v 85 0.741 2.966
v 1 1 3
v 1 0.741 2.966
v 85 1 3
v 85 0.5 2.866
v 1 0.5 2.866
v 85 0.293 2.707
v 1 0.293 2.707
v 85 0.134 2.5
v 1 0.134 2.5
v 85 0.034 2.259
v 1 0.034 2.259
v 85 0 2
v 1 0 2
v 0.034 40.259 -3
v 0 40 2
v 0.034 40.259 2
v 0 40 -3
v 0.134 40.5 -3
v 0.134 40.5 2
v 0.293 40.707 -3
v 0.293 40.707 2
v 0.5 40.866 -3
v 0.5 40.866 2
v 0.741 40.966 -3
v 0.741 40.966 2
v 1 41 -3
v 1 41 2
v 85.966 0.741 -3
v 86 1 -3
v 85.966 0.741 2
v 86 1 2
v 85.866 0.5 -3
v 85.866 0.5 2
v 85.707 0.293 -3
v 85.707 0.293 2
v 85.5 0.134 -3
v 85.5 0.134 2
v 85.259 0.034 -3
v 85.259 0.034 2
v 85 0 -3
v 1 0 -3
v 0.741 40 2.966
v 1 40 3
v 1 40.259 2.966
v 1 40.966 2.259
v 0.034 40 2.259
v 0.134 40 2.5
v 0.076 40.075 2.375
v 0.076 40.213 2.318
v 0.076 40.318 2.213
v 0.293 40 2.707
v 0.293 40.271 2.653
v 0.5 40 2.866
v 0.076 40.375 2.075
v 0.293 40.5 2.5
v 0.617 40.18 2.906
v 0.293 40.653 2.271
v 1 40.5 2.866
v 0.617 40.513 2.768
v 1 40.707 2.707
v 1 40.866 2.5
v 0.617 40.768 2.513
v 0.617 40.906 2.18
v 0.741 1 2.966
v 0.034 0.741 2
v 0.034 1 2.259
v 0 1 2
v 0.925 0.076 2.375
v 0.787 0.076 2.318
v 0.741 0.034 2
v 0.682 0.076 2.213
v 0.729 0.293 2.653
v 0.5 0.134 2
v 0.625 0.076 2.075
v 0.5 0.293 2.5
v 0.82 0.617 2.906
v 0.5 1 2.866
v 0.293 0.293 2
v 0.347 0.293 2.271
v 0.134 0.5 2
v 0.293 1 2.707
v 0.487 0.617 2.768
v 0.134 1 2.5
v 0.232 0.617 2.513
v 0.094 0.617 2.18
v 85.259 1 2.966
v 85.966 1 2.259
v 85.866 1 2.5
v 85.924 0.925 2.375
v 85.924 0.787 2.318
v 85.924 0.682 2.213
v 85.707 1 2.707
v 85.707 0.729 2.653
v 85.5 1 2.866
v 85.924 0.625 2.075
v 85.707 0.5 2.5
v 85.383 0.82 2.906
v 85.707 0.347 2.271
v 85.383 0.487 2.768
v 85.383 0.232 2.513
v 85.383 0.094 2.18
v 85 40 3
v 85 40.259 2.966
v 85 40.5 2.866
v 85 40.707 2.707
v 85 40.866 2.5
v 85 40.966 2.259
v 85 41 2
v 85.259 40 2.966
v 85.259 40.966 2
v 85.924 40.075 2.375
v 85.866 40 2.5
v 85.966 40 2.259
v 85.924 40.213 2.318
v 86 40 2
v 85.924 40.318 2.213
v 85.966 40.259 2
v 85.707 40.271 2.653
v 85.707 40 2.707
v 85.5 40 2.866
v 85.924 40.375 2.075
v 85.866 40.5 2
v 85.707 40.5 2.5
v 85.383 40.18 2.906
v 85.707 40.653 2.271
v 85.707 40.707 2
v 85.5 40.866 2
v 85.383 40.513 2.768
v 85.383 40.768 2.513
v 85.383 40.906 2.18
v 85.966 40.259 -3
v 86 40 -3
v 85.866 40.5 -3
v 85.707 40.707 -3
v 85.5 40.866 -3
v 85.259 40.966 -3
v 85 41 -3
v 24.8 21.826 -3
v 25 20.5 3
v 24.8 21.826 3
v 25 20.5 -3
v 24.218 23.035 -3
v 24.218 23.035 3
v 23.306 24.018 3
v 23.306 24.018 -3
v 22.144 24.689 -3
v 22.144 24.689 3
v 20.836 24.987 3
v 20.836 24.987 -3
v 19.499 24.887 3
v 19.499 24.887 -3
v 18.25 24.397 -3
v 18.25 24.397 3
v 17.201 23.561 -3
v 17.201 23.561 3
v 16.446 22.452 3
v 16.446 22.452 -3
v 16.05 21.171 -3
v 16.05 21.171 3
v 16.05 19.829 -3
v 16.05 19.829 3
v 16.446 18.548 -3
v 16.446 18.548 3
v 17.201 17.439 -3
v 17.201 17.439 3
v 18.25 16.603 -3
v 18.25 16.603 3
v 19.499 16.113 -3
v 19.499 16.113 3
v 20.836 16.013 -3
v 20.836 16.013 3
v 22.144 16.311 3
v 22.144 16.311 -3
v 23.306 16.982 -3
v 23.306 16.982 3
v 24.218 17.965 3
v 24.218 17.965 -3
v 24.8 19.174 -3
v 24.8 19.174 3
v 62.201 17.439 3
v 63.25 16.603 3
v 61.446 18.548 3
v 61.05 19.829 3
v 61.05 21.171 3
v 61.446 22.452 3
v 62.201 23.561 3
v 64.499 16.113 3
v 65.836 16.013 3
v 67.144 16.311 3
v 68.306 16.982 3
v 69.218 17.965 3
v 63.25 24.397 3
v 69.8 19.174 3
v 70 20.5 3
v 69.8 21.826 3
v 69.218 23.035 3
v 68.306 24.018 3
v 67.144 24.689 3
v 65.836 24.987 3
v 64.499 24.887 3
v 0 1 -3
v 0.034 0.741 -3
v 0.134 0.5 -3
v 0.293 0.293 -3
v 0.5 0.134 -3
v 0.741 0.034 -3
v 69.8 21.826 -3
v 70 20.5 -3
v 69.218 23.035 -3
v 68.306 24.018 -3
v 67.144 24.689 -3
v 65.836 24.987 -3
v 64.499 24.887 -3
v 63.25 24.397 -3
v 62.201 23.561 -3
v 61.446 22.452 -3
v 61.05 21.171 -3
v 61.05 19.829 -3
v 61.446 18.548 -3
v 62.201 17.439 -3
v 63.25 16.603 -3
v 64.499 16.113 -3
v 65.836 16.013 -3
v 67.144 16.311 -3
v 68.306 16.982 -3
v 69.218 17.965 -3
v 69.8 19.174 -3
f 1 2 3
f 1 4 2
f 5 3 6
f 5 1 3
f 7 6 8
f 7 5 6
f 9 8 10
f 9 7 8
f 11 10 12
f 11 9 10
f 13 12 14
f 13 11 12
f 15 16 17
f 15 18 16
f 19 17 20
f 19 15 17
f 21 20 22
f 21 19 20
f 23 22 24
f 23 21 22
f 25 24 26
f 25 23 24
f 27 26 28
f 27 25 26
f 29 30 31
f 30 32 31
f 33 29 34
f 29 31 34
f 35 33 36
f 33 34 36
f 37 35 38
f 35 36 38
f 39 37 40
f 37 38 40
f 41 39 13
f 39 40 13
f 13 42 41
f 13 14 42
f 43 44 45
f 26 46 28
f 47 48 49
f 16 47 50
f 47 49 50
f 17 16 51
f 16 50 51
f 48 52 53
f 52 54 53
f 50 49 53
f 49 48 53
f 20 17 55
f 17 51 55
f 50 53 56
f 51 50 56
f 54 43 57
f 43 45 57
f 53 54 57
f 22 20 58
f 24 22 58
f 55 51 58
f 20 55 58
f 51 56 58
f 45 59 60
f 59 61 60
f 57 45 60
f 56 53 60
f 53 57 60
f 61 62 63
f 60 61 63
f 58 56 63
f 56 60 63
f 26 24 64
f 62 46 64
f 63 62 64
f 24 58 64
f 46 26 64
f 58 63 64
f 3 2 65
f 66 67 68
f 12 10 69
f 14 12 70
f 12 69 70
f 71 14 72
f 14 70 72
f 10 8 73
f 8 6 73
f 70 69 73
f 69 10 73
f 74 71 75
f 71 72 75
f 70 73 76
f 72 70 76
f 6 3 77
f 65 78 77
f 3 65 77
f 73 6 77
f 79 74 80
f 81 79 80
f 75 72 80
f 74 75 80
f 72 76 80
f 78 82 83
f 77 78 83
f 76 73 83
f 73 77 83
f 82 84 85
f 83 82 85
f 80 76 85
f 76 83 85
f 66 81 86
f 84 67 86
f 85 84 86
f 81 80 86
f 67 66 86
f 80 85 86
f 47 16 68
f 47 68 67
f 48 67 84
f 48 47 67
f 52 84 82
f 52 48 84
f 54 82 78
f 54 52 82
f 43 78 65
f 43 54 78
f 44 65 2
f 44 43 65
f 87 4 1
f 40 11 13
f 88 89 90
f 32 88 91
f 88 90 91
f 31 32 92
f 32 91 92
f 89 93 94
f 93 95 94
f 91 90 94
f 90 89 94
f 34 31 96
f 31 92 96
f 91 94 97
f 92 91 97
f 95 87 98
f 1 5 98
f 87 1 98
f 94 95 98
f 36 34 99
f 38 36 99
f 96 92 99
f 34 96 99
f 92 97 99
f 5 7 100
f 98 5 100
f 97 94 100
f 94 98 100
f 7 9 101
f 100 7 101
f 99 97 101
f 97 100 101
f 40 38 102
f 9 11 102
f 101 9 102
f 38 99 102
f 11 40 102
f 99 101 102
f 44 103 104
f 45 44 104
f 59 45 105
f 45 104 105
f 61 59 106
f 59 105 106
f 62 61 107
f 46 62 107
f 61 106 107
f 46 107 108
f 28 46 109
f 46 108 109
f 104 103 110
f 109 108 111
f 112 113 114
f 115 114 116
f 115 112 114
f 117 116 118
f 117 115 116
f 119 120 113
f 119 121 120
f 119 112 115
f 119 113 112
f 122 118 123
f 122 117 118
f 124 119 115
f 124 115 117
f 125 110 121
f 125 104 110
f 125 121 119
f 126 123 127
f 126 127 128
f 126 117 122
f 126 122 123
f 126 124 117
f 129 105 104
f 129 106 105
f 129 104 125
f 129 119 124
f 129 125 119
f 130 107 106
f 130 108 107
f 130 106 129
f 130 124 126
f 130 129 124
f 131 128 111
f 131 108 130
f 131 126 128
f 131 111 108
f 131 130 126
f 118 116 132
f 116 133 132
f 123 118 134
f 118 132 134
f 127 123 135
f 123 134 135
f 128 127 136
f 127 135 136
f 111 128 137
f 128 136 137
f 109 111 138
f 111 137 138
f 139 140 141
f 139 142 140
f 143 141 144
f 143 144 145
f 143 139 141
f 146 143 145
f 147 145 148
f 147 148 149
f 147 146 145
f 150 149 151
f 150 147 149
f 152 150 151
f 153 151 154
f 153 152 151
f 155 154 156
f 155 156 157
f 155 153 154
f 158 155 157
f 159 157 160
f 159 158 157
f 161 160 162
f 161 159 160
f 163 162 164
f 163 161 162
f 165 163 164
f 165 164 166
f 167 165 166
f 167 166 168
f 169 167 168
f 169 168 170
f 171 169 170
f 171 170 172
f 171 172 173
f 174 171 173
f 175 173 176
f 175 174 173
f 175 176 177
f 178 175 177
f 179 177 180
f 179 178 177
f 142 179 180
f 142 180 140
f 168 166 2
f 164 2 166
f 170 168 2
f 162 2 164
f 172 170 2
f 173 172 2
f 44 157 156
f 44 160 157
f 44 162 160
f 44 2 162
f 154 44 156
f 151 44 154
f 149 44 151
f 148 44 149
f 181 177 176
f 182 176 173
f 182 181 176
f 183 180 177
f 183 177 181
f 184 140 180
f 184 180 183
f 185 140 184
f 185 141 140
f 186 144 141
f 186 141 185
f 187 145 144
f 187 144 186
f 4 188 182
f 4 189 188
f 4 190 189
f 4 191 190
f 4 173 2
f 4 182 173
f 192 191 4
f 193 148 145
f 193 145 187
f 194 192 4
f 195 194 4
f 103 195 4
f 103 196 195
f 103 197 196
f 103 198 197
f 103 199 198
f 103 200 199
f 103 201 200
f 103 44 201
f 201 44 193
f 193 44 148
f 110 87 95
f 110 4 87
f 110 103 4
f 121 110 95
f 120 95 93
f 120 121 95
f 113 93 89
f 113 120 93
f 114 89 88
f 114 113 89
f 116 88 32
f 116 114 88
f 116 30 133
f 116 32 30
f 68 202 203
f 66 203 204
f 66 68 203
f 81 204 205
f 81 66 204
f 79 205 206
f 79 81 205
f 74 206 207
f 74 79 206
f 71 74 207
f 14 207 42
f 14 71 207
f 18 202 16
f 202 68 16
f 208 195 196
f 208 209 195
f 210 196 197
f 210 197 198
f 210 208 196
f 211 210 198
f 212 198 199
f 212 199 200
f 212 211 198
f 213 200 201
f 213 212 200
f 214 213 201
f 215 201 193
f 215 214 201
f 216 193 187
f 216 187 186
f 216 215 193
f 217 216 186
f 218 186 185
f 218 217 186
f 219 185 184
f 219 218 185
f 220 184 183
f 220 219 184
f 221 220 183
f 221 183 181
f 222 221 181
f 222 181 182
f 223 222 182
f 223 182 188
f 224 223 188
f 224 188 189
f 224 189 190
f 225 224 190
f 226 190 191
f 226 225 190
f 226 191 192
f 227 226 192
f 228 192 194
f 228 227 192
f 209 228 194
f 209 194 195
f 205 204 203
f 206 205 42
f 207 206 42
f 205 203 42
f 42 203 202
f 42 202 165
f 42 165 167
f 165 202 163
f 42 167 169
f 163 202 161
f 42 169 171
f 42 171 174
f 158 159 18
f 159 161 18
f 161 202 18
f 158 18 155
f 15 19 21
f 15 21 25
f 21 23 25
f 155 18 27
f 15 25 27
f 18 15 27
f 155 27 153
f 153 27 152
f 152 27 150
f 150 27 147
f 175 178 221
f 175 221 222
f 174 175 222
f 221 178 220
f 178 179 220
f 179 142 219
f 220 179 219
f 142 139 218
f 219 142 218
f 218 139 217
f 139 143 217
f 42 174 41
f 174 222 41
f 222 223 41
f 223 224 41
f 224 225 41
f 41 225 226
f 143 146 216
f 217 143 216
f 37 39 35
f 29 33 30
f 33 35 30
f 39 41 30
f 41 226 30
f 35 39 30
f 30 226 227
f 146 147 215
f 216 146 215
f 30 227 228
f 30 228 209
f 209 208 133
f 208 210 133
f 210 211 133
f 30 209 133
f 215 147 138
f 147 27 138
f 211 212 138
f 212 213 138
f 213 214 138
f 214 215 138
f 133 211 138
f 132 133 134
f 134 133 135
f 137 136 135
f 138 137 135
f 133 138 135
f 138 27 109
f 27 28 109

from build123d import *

# Parameters (mm, degrees)
SKETCH1_W           = 86
SKETCH1_H           = 41
SKETCH1_R           = 4.5
BOSS_EXTRUDE1_DEPTH = 3
FILLET1_R           = 1


with BuildPart() as part:
    # Sketch1 → Boss-Extrude1 (new body, symmetric)
    with BuildSketch(Plane.XY):
        with Locations((43, 20.5)):
            Rectangle(SKETCH1_W, SKETCH1_H)
        with Locations((20.5, 20.5)):
            Circle(SKETCH1_R, mode=Mode.SUBTRACT)
        with Locations((65.5, 20.5)):
            Circle(SKETCH1_R, mode=Mode.SUBTRACT)
    extrude(amount=BOSS_EXTRUDE1_DEPTH, both=True)

    # Fillet1
    fillet1_edges = [part.edges().sort_by_distance(p)[0] for p in [
        (43, 41, 3),
        (0, 20.5, 3),
        (43, 0, 3),
        (86, 20.5, 3),
        (0, 0, 0),
        (0, 41, 0),
        (86, 41, 0),
        (86, 0, 0),
    ]]
    fillet(fillet1_edges, radius=FILLET1_R)


solid = part.part
